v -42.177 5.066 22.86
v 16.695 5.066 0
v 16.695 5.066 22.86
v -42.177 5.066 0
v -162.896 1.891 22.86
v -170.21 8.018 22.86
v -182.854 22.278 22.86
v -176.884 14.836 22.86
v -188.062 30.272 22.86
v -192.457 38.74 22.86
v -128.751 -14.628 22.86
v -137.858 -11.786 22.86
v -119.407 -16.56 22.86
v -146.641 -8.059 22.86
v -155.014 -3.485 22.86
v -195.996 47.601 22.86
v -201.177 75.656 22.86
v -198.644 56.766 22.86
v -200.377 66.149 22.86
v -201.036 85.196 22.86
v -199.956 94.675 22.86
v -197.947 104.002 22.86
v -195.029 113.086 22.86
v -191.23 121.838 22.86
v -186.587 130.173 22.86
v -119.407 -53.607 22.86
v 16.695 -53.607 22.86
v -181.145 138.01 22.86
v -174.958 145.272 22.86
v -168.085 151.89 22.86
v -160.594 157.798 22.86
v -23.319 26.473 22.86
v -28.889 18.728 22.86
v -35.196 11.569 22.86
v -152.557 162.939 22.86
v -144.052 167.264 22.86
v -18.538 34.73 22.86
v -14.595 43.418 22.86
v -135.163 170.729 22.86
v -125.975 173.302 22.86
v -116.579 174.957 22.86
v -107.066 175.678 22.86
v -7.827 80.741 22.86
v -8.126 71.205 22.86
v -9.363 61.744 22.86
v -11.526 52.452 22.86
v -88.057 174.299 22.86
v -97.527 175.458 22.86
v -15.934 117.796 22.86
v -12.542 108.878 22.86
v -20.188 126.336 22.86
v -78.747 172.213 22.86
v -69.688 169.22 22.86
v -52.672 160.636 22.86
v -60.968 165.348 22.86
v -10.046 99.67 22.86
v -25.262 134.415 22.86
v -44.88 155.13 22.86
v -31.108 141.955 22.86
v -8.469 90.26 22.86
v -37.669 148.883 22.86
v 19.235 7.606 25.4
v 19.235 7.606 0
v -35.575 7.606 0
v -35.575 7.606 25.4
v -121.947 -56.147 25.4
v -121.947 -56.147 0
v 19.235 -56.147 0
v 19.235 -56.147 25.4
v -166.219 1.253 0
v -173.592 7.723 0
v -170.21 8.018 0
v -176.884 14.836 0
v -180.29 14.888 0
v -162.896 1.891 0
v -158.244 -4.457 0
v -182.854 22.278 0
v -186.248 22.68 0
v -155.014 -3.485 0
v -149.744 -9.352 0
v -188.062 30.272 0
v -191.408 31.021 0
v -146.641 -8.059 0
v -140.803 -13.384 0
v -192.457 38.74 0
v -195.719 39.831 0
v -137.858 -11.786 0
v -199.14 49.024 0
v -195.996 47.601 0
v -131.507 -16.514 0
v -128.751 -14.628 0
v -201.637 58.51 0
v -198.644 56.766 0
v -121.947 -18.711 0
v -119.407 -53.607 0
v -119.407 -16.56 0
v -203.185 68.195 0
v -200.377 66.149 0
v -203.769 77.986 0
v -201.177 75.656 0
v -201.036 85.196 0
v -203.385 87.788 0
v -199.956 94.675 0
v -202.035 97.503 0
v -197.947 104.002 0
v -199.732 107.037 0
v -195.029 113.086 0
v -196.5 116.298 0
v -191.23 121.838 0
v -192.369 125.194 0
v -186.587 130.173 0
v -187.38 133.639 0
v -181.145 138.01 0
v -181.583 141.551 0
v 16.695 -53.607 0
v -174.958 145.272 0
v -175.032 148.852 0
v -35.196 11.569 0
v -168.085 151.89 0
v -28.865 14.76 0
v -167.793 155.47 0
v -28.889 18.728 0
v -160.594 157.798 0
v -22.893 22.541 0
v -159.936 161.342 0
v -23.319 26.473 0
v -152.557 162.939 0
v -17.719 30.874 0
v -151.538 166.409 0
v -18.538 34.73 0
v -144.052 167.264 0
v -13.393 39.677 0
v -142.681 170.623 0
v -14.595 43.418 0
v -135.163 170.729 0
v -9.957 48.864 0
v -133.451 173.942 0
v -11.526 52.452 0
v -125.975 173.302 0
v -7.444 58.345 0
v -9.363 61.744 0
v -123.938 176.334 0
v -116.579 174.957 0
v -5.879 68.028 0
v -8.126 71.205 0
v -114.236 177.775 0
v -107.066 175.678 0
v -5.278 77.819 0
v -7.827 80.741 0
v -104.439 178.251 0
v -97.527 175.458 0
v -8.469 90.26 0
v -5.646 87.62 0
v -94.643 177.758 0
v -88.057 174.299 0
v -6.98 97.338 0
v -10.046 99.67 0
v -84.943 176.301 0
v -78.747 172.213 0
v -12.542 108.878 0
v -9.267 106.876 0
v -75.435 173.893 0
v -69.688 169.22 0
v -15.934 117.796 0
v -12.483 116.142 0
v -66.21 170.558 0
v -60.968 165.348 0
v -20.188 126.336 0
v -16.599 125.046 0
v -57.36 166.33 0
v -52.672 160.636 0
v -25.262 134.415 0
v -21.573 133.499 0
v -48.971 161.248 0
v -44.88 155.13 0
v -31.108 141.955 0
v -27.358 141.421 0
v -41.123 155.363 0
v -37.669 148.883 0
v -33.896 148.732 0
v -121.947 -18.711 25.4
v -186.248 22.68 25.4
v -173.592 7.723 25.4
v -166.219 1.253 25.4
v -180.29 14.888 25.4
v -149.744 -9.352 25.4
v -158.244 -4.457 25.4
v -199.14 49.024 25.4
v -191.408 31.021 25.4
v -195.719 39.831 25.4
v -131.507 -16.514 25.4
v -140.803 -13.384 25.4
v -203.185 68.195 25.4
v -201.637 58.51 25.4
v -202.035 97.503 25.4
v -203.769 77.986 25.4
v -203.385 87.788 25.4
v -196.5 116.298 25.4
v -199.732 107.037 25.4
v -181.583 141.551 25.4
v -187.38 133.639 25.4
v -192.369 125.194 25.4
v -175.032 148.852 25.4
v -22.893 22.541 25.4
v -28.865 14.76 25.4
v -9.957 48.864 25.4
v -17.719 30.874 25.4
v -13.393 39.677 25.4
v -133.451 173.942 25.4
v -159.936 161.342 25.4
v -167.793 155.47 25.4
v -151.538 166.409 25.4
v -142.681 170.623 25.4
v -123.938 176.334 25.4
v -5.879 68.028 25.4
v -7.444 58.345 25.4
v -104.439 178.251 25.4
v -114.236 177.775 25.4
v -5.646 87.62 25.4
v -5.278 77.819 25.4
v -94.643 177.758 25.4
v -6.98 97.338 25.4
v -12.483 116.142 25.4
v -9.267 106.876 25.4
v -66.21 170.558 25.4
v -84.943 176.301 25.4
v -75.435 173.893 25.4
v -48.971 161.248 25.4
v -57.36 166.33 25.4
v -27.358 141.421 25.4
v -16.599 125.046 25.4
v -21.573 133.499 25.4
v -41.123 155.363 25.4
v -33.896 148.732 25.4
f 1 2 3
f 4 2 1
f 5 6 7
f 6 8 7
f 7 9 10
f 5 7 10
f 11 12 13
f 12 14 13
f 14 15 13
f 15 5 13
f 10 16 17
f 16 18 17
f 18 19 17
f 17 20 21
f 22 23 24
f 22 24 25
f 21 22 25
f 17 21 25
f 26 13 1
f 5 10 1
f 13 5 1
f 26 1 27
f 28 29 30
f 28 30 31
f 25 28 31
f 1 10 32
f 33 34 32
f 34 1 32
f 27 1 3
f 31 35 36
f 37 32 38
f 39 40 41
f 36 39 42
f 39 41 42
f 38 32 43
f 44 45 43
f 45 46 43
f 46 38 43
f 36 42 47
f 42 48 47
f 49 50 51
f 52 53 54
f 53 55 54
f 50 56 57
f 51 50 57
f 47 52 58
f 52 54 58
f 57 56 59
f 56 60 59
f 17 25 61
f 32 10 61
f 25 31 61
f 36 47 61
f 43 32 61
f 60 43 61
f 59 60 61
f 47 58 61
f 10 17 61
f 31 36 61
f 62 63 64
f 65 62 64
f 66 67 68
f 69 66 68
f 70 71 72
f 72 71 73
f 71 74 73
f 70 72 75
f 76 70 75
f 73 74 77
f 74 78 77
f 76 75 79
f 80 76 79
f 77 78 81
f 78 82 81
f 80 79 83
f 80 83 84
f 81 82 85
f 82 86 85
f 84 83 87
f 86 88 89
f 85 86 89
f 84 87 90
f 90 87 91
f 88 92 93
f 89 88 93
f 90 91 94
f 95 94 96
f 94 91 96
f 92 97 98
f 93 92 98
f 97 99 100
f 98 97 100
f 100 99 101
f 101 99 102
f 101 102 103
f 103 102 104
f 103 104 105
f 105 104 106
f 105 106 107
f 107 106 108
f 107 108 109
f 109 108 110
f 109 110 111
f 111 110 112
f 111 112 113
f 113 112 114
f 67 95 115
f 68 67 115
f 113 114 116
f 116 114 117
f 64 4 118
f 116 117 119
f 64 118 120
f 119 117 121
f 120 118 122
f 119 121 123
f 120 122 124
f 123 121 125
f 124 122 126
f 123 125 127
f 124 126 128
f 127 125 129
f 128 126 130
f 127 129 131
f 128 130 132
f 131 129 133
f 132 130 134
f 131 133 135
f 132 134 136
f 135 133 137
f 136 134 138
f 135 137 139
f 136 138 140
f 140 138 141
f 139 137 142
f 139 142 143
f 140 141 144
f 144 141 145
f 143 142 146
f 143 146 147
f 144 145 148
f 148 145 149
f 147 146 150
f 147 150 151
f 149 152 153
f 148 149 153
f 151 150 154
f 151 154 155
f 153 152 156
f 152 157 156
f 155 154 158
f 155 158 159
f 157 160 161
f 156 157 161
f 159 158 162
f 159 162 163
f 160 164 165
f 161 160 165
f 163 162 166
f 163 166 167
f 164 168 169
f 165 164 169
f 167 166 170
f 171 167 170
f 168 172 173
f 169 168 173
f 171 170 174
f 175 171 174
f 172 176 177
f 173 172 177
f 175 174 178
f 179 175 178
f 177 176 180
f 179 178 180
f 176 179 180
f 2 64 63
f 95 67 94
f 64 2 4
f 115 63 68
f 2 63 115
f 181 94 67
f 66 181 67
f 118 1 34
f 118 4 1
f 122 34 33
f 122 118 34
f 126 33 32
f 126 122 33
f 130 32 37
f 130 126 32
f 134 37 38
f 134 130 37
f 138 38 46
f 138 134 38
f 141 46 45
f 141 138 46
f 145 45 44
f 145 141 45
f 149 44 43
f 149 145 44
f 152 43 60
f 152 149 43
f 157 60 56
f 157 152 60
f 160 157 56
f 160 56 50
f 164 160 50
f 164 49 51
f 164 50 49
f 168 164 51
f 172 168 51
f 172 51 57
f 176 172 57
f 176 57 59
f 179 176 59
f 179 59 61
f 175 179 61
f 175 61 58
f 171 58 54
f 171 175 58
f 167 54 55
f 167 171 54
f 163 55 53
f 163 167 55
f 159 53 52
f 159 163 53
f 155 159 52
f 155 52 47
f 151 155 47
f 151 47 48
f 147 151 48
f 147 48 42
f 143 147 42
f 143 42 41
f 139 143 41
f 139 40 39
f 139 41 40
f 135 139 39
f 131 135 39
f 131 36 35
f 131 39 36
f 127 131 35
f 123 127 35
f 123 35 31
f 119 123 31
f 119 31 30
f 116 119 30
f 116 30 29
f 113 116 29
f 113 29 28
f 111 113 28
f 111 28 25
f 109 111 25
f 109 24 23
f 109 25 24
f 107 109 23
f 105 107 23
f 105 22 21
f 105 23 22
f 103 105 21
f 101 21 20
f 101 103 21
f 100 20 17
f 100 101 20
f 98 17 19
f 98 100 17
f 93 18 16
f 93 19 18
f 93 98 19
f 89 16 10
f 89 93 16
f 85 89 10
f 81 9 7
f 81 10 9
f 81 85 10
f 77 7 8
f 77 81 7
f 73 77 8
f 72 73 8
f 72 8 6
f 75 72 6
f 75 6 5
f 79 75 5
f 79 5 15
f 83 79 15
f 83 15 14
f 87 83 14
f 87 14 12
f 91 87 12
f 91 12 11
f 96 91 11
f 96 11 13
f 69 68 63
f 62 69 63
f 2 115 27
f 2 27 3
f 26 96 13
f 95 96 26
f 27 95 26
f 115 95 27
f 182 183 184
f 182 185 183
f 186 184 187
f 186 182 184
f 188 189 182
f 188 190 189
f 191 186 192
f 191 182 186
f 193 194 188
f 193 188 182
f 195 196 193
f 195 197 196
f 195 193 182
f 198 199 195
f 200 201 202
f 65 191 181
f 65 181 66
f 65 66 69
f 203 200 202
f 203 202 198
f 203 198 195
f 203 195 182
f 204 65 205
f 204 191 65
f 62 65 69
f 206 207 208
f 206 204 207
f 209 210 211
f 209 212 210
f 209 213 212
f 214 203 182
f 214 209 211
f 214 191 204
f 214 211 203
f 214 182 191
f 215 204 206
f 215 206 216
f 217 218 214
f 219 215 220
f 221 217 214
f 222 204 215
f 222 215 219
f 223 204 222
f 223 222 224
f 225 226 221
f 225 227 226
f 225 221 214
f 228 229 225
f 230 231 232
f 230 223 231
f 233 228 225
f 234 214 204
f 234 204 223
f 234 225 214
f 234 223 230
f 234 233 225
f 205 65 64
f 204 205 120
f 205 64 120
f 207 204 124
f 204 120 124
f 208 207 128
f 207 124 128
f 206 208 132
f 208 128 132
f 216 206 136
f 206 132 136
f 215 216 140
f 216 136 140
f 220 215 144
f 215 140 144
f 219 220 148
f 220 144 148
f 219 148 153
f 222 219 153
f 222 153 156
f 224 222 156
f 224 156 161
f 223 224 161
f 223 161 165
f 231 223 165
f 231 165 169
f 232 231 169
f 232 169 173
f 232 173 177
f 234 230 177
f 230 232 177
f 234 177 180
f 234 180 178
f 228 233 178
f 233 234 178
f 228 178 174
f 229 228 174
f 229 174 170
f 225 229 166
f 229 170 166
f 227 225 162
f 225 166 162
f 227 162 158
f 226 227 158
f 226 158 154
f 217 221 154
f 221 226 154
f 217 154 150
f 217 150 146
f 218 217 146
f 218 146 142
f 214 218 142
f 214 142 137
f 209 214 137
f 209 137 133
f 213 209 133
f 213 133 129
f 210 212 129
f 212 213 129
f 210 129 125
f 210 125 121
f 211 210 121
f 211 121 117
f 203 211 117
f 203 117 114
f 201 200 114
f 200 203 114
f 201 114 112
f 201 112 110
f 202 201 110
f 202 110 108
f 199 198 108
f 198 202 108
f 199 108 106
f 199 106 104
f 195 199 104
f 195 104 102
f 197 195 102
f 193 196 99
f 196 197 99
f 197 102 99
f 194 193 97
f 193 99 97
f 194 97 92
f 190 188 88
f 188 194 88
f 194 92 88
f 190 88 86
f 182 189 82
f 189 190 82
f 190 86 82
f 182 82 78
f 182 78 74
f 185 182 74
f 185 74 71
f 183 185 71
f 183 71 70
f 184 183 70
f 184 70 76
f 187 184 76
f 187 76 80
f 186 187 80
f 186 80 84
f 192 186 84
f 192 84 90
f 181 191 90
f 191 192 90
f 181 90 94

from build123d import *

# Parameters (mm, degrees)
F1_DEPTH = 25.4
F3_DEPTH = 25.4
F4_T     = -2.54


with BuildPart() as f1:
    # F0 (on Top) → F1 (new body)
    with BuildSketch(Plane.XY):
        with BuildLine():
            Line((19.2348733544, 7.6057617553), (-35.5748815684, 7.6057617553))
            ThreePointArc((-35.5748815684, 7.6057617553), (-75.5952649714, -15.9430811399), (-121.9473853707, -18.71075596))
            Line((-121.9473853707, -18.71075596), (-121.9473853707, -56.1465583742))
            Line((-121.9473853707, -56.1465583742), (19.2348733544, -56.1465583742))
            Line((19.2348733544, -56.1465583742), (19.2348733544, 7.6057617553))
        make_face()
        with BuildLine():
            Line((-35.5748815684, 7.6057617553), (-121.9473853707, 7.6057617553))
            Line((-121.9473853707, 7.6057617553), (-121.9473853707, -18.71075596))
            ThreePointArc((-121.9473853707, -18.71075596), (-75.5952649714, -15.9430811399), (-35.5748815684, 7.6057617553))
        make_face()
        with BuildLine():
            Line((-121.9473853707, -18.71075596), (-121.9473853707, 7.6057617553))
            Line((-121.9473853707, 7.6057617553), (-35.5748815684, 7.6057617553))
            ThreePointArc((-35.5748815684, 7.6057617553), (-13.1607449358, 40.2200486566), (-5.2712796474, 78.9994448423))
            ThreePointArc((-5.2712796474, 78.9994448423), (-168.2469260973, 155.0924750547), (-121.9473853707, -18.71075596))
        make_face()
    extrude(amount=F1_DEPTH)

    # F2 (on face) → F3 (join)
    with BuildSketch(Plane.XY.offset(25.4)):
        with BuildLine():
            ThreePointArc((-149.3627248428, -9.5459612091), (-95.718013043, 19.6715775936), (-74.3504000093, 76.8978372216))
            ThreePointArc((-74.3504000093, 76.8978372216), (-97.8658435535, 136.509233554), (-155.7459184192, 164.0118078208))
            ThreePointArc((-155.7459184192, 164.0118078208), (-203.7075635009, 75.3515840449), (-149.3627248428, -9.5459612091))
        make_face()
    extrude(amount=-F3_DEPTH)

    # F4
    f4_openings = [f1.faces().sort_by_distance(p)[0] for p in [
        (-92.78675, 58.561614, 0),
    ]]
    offset(amount=F4_T, openings=f4_openings, kind=Kind.INTERSECTION)


solid = f1.part
